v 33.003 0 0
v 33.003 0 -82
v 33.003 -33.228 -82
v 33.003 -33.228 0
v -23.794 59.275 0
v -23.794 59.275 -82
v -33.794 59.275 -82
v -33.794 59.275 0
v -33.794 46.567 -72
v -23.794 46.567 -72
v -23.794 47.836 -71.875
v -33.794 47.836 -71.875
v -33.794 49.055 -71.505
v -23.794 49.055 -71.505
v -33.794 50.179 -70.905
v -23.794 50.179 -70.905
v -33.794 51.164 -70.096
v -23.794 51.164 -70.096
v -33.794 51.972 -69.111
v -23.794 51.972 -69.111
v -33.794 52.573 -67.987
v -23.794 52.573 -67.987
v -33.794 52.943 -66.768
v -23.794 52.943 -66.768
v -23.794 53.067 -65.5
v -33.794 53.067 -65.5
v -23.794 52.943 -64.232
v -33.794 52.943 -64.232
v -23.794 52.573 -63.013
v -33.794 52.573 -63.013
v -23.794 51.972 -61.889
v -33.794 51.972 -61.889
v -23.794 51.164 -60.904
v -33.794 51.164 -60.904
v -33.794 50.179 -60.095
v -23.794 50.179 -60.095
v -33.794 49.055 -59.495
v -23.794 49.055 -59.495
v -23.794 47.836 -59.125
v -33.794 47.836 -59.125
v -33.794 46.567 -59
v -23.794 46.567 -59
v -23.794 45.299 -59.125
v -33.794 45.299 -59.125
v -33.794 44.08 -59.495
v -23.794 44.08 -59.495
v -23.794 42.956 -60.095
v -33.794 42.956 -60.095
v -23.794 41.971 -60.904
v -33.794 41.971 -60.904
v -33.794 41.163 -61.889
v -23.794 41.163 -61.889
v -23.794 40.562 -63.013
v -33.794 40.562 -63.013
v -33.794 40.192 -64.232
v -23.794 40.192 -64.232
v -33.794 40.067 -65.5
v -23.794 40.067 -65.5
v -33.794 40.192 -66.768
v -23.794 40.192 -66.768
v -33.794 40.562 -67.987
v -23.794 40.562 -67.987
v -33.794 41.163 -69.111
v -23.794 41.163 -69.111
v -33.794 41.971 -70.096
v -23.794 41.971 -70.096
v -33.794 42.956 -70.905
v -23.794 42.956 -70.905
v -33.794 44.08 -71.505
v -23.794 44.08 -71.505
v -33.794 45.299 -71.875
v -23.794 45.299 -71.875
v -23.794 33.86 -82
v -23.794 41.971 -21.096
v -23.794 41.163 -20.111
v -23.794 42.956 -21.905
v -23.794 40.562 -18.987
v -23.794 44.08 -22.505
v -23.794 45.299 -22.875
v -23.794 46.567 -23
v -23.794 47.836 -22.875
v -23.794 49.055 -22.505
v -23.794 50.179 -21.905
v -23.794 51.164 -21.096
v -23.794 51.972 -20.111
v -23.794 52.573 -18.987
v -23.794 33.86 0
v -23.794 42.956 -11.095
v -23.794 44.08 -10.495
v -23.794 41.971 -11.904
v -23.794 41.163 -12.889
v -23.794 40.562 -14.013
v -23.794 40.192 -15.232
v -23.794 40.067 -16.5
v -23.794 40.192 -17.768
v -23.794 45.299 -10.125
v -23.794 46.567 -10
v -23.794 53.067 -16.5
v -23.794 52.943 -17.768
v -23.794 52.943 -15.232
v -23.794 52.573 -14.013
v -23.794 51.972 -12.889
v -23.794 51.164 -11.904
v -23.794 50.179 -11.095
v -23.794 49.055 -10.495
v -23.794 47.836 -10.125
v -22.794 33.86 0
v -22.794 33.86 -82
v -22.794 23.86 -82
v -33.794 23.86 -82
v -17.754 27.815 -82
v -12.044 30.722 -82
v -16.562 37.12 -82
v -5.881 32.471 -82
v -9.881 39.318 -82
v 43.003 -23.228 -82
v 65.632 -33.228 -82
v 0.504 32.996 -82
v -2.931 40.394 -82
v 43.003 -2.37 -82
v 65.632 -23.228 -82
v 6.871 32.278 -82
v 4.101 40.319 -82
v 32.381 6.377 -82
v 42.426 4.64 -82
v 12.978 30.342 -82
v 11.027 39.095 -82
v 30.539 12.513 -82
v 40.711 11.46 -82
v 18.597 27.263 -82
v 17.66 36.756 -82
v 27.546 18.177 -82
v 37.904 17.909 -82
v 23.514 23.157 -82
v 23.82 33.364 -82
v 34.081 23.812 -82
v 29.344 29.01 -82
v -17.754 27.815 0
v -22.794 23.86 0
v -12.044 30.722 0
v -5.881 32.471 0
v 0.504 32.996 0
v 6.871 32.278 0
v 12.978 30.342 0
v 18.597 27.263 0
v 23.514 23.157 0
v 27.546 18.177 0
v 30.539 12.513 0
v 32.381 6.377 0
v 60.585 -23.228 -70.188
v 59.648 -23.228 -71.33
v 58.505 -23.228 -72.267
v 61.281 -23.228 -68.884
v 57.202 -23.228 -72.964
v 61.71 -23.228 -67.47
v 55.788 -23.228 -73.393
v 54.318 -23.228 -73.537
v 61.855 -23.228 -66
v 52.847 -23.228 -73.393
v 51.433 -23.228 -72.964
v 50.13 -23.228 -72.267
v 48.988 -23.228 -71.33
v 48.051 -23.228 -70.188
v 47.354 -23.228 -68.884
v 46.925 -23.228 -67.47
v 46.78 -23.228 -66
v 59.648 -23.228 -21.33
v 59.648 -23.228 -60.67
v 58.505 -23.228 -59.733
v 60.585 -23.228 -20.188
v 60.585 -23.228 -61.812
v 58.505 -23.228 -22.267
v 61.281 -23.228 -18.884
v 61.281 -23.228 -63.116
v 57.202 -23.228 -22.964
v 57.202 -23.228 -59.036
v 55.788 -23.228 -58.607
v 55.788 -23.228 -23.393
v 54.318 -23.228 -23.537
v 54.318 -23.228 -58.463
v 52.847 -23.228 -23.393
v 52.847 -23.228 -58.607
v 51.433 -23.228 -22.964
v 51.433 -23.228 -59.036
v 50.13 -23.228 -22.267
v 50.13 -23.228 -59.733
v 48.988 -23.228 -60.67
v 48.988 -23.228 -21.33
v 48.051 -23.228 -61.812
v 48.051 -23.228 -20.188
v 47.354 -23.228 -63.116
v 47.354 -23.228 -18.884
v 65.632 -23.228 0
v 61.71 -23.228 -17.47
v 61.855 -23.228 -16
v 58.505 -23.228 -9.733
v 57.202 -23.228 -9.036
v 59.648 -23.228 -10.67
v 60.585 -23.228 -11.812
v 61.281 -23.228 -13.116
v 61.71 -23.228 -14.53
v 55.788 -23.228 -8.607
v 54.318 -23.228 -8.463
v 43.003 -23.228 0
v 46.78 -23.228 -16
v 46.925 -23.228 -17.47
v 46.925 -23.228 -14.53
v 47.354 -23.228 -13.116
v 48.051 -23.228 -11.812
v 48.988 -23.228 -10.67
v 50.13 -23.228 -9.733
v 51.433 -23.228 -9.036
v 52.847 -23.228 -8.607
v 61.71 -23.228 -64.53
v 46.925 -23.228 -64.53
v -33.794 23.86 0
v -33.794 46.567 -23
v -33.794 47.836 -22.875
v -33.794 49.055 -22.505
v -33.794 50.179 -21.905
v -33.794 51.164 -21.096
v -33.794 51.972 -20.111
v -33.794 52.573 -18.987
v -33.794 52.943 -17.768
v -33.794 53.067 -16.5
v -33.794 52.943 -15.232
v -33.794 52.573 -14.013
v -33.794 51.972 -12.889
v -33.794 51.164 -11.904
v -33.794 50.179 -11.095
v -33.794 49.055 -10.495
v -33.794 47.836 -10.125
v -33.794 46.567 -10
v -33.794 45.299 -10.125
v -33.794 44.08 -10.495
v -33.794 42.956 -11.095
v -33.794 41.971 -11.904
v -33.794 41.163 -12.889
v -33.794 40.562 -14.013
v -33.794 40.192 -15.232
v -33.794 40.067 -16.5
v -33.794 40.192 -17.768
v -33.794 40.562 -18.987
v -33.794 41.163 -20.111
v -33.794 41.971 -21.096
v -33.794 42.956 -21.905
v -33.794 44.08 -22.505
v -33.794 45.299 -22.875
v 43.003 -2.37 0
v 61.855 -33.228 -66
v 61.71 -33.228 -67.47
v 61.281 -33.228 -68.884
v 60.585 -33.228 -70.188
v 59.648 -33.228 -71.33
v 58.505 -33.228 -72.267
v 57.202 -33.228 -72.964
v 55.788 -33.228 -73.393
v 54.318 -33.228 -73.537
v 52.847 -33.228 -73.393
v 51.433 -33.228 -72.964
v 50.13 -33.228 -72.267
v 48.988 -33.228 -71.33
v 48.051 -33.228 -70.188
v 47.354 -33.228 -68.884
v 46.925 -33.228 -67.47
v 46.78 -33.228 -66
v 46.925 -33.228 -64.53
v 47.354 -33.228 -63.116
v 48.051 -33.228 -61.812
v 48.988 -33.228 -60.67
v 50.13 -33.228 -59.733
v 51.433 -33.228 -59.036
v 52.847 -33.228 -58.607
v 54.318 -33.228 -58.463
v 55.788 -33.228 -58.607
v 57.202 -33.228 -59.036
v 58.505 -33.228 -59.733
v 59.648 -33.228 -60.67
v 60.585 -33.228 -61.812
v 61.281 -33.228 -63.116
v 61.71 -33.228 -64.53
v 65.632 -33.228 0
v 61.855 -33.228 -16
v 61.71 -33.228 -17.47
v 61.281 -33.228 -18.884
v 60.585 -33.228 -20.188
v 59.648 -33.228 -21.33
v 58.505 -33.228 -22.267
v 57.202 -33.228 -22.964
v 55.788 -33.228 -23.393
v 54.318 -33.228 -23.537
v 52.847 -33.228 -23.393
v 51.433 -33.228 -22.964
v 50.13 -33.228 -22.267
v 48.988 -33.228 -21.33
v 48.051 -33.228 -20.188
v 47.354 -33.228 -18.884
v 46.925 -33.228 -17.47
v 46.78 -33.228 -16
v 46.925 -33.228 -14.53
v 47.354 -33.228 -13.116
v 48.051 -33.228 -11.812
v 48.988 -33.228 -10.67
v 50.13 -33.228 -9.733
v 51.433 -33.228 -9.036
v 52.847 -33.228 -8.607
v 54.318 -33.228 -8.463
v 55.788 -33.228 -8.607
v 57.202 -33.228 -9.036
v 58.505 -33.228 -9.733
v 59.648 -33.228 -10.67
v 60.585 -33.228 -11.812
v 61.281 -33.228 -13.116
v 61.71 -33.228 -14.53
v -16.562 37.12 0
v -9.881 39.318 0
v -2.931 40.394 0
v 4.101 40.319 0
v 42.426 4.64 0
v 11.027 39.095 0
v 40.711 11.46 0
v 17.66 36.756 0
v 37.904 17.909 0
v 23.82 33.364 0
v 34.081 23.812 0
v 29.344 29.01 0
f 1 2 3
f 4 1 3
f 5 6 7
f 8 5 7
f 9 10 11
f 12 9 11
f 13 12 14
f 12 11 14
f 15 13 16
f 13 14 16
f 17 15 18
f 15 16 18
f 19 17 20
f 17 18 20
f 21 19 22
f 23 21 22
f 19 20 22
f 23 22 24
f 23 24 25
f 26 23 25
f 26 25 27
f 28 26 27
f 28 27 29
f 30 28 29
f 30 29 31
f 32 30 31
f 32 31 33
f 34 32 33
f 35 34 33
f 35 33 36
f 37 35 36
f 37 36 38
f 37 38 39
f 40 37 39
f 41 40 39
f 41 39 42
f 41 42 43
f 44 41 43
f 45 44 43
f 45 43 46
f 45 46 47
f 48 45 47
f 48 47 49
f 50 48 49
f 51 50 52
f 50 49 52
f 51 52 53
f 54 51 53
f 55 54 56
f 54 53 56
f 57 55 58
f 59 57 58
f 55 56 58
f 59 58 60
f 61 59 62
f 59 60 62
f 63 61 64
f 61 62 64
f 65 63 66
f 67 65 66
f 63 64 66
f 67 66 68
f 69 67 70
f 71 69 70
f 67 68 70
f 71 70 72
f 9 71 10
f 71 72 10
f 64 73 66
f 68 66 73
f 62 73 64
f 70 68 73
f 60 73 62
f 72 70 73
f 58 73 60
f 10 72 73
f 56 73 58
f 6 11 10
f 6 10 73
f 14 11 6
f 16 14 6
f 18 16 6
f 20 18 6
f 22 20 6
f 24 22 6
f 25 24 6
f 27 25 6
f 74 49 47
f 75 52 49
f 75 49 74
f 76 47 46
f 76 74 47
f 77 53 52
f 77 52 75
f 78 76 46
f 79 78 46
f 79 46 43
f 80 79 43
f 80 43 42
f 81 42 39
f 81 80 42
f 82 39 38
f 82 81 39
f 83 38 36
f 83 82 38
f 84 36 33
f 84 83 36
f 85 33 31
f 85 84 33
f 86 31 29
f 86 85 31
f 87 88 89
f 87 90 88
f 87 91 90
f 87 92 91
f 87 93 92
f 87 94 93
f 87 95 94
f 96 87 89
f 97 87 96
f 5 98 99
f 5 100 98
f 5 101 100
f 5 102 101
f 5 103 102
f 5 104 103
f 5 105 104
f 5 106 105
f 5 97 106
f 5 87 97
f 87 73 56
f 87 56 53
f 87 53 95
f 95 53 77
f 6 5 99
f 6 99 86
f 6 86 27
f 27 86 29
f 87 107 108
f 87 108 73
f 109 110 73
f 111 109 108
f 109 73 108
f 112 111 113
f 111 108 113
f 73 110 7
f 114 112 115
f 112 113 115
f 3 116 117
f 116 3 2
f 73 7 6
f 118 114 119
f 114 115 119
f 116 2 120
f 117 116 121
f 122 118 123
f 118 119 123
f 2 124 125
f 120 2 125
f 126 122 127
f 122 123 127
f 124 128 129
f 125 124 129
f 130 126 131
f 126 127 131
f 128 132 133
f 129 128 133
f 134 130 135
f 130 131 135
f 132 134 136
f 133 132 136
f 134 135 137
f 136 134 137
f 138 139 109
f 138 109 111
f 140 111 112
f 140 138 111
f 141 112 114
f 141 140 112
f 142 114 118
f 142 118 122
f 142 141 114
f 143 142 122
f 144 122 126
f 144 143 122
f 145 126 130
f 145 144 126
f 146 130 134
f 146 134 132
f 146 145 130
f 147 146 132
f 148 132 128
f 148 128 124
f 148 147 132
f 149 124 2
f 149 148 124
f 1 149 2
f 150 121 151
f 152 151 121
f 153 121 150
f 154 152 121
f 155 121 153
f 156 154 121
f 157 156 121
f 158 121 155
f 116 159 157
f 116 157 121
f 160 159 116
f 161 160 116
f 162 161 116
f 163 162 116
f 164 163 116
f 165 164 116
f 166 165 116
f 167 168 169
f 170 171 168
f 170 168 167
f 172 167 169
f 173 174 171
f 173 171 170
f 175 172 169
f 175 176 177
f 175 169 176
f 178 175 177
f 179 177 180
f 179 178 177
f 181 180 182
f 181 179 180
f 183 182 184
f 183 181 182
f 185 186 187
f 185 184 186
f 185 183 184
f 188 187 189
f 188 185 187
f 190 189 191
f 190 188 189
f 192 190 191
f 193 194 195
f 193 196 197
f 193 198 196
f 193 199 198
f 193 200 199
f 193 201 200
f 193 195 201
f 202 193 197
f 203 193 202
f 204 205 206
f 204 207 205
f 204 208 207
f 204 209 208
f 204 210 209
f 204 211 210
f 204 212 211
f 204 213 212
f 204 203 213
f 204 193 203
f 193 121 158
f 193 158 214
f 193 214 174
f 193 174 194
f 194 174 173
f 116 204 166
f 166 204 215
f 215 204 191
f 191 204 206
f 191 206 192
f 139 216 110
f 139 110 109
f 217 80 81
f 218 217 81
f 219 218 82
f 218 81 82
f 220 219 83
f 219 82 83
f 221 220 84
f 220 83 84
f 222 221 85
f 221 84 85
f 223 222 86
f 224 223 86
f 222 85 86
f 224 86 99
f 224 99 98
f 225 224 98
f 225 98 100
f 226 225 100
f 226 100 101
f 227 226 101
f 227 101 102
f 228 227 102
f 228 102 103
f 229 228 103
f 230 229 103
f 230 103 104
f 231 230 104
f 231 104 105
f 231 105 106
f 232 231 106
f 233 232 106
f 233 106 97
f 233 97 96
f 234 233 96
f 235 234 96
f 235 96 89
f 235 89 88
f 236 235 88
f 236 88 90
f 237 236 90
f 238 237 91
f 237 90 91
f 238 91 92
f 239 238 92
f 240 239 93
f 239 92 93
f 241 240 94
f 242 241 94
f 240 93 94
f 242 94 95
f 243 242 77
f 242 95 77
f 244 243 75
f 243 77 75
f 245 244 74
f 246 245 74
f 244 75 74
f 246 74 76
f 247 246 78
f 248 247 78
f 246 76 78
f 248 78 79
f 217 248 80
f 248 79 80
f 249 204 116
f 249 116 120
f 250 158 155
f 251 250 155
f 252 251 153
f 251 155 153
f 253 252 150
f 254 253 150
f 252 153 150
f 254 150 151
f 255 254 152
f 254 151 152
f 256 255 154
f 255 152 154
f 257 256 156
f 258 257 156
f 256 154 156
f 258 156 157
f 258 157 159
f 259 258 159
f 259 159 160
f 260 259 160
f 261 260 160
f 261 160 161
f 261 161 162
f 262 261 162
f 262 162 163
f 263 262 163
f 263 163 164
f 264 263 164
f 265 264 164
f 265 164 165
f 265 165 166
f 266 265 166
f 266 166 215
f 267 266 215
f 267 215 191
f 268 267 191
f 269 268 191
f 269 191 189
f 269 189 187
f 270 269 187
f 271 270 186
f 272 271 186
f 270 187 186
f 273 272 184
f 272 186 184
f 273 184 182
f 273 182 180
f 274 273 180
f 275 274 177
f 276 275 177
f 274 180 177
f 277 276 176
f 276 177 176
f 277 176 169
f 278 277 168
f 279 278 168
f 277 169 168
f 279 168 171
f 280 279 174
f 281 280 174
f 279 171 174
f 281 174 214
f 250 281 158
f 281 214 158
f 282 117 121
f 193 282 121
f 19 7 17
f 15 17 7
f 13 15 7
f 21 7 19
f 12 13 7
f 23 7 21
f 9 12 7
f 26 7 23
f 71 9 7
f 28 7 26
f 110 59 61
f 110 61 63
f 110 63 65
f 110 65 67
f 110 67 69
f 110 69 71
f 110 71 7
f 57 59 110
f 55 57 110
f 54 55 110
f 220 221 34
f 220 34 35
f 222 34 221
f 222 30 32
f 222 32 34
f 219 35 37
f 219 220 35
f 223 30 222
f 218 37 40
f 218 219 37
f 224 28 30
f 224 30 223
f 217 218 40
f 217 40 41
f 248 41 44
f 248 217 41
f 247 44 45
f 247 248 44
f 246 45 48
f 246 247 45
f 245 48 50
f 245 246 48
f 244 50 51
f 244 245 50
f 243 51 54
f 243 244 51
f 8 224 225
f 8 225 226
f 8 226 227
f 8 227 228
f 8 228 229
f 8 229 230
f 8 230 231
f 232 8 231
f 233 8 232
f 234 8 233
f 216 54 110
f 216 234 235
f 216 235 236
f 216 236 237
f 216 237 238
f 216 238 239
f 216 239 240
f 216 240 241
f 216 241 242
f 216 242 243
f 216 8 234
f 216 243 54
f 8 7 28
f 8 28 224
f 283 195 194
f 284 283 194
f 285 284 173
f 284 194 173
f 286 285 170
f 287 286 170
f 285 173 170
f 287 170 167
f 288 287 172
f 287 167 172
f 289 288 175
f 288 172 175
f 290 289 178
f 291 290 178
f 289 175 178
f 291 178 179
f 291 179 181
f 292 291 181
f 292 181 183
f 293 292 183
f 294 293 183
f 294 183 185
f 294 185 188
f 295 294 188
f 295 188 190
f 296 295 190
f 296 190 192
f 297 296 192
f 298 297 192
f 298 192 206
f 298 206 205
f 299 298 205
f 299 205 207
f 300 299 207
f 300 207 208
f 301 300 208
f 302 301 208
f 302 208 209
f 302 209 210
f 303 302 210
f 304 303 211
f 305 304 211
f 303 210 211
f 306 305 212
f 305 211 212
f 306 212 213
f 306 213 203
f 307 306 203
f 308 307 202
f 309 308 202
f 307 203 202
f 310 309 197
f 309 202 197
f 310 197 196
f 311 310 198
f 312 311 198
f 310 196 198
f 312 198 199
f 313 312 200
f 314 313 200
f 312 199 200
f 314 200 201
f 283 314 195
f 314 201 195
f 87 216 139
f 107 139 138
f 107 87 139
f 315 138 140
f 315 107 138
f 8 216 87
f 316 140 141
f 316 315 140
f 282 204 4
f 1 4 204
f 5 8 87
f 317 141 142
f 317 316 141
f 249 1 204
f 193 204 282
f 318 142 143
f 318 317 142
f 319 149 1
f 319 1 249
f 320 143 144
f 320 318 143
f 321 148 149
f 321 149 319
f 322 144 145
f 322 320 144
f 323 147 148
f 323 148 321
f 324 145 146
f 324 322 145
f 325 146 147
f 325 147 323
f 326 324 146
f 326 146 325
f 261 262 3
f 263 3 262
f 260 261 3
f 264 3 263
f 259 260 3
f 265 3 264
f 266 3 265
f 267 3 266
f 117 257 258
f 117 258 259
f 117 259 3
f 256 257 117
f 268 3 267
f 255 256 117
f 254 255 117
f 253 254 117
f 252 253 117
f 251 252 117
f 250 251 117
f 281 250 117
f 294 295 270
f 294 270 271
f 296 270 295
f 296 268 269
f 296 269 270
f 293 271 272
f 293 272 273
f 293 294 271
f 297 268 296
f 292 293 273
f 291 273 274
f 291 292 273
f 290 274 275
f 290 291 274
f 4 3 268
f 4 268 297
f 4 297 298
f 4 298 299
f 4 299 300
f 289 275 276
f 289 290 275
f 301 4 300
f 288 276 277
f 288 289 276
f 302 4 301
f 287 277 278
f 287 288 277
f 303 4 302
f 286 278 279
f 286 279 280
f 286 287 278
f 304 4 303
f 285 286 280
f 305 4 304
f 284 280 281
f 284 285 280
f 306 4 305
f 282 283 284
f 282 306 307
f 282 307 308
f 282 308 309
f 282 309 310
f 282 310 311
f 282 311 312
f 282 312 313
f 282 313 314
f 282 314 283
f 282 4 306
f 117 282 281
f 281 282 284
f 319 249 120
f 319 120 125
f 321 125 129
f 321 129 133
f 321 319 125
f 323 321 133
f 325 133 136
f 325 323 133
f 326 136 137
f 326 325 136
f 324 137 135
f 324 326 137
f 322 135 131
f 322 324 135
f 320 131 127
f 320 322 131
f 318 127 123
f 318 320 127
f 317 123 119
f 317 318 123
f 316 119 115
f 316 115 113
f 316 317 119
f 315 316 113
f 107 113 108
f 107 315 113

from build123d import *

# Parameters (mm, degrees)
BOSS_EXTRUDE1_DEPTH = 82
SKETCH3_R           = 7.537472245
CUT_EXTRUDE2_DEPTH  = 11
SKETCH4_R           = 6.5
CUT_EXTRUDE3_DEPTH  = 11


with BuildPart() as part:
    # Sketch1 → Boss-Extrude1 (new body)
    with BuildSketch(Plane.XY):
        with BuildLine():
            Line((33.003348812, 0), (33.003348812, -33.227979662))
            Line((33.003348812, -33.227979662), (65.632108119, -33.227979662))
            Line((65.632108119, -33.227979662), (65.632108119, -23.227979662))
            Line((65.632108119, -23.227979662), (43.003348812, -23.227979662))
            Line((43.003348812, -23.227979662), (43.003348812, -2.369569967))
            ThreePointArc((43.003348812, -2.369569967), (20.809611253, 35.186501293), (-22.793831907, 33.859768466))
            Line((-22.793831907, 33.859768466), (-23.793831907, 33.859768466))
            Line((-23.793831907, 33.859768466), (-23.793831907, 59.275147612))
            Line((-23.793831907, 59.275147612), (-33.793831907, 59.275147612))
            Line((-33.793831907, 59.275147612), (-33.793831907, 23.859768466))
            Line((-33.793831907, 23.859768466), (-22.793831907, 23.859768466))
            ThreePointArc((-22.793831907, 23.859768466), (12.978190551, 30.342272193), (33.003348812, 0))
        make_face()
    extrude(amount=-BOSS_EXTRUDE1_DEPTH)

    # Sketch3 → Cut-Extrude2 (cut, through all)
    with BuildSketch(Plane(origin=(0, -23.227979662, 0), x_dir=(1, 0, 0), z_dir=(0, 1, 0))):
        with Locations((54.317728466, 16)):
            Circle(SKETCH3_R)
        with Locations((54.317728466, 66)):
            Circle(SKETCH3_R)
    extrude(amount=-CUT_EXTRUDE2_DEPTH, mode=Mode.SUBTRACT)

    # Sketch4 → Cut-Extrude3 (cut, through all)
    with BuildSketch(Plane(origin=(-23.793831907, 0, 0), x_dir=(0, 0, -1), z_dir=(1, 0, 0))):
        with Locations((16.5, 46.567458039)):
            Circle(SKETCH4_R)
        with Locations((65.5, 46.567458039)):
            Circle(SKETCH4_R)
    extrude(amount=-CUT_EXTRUDE3_DEPTH, mode=Mode.SUBTRACT)


solid = part.part
